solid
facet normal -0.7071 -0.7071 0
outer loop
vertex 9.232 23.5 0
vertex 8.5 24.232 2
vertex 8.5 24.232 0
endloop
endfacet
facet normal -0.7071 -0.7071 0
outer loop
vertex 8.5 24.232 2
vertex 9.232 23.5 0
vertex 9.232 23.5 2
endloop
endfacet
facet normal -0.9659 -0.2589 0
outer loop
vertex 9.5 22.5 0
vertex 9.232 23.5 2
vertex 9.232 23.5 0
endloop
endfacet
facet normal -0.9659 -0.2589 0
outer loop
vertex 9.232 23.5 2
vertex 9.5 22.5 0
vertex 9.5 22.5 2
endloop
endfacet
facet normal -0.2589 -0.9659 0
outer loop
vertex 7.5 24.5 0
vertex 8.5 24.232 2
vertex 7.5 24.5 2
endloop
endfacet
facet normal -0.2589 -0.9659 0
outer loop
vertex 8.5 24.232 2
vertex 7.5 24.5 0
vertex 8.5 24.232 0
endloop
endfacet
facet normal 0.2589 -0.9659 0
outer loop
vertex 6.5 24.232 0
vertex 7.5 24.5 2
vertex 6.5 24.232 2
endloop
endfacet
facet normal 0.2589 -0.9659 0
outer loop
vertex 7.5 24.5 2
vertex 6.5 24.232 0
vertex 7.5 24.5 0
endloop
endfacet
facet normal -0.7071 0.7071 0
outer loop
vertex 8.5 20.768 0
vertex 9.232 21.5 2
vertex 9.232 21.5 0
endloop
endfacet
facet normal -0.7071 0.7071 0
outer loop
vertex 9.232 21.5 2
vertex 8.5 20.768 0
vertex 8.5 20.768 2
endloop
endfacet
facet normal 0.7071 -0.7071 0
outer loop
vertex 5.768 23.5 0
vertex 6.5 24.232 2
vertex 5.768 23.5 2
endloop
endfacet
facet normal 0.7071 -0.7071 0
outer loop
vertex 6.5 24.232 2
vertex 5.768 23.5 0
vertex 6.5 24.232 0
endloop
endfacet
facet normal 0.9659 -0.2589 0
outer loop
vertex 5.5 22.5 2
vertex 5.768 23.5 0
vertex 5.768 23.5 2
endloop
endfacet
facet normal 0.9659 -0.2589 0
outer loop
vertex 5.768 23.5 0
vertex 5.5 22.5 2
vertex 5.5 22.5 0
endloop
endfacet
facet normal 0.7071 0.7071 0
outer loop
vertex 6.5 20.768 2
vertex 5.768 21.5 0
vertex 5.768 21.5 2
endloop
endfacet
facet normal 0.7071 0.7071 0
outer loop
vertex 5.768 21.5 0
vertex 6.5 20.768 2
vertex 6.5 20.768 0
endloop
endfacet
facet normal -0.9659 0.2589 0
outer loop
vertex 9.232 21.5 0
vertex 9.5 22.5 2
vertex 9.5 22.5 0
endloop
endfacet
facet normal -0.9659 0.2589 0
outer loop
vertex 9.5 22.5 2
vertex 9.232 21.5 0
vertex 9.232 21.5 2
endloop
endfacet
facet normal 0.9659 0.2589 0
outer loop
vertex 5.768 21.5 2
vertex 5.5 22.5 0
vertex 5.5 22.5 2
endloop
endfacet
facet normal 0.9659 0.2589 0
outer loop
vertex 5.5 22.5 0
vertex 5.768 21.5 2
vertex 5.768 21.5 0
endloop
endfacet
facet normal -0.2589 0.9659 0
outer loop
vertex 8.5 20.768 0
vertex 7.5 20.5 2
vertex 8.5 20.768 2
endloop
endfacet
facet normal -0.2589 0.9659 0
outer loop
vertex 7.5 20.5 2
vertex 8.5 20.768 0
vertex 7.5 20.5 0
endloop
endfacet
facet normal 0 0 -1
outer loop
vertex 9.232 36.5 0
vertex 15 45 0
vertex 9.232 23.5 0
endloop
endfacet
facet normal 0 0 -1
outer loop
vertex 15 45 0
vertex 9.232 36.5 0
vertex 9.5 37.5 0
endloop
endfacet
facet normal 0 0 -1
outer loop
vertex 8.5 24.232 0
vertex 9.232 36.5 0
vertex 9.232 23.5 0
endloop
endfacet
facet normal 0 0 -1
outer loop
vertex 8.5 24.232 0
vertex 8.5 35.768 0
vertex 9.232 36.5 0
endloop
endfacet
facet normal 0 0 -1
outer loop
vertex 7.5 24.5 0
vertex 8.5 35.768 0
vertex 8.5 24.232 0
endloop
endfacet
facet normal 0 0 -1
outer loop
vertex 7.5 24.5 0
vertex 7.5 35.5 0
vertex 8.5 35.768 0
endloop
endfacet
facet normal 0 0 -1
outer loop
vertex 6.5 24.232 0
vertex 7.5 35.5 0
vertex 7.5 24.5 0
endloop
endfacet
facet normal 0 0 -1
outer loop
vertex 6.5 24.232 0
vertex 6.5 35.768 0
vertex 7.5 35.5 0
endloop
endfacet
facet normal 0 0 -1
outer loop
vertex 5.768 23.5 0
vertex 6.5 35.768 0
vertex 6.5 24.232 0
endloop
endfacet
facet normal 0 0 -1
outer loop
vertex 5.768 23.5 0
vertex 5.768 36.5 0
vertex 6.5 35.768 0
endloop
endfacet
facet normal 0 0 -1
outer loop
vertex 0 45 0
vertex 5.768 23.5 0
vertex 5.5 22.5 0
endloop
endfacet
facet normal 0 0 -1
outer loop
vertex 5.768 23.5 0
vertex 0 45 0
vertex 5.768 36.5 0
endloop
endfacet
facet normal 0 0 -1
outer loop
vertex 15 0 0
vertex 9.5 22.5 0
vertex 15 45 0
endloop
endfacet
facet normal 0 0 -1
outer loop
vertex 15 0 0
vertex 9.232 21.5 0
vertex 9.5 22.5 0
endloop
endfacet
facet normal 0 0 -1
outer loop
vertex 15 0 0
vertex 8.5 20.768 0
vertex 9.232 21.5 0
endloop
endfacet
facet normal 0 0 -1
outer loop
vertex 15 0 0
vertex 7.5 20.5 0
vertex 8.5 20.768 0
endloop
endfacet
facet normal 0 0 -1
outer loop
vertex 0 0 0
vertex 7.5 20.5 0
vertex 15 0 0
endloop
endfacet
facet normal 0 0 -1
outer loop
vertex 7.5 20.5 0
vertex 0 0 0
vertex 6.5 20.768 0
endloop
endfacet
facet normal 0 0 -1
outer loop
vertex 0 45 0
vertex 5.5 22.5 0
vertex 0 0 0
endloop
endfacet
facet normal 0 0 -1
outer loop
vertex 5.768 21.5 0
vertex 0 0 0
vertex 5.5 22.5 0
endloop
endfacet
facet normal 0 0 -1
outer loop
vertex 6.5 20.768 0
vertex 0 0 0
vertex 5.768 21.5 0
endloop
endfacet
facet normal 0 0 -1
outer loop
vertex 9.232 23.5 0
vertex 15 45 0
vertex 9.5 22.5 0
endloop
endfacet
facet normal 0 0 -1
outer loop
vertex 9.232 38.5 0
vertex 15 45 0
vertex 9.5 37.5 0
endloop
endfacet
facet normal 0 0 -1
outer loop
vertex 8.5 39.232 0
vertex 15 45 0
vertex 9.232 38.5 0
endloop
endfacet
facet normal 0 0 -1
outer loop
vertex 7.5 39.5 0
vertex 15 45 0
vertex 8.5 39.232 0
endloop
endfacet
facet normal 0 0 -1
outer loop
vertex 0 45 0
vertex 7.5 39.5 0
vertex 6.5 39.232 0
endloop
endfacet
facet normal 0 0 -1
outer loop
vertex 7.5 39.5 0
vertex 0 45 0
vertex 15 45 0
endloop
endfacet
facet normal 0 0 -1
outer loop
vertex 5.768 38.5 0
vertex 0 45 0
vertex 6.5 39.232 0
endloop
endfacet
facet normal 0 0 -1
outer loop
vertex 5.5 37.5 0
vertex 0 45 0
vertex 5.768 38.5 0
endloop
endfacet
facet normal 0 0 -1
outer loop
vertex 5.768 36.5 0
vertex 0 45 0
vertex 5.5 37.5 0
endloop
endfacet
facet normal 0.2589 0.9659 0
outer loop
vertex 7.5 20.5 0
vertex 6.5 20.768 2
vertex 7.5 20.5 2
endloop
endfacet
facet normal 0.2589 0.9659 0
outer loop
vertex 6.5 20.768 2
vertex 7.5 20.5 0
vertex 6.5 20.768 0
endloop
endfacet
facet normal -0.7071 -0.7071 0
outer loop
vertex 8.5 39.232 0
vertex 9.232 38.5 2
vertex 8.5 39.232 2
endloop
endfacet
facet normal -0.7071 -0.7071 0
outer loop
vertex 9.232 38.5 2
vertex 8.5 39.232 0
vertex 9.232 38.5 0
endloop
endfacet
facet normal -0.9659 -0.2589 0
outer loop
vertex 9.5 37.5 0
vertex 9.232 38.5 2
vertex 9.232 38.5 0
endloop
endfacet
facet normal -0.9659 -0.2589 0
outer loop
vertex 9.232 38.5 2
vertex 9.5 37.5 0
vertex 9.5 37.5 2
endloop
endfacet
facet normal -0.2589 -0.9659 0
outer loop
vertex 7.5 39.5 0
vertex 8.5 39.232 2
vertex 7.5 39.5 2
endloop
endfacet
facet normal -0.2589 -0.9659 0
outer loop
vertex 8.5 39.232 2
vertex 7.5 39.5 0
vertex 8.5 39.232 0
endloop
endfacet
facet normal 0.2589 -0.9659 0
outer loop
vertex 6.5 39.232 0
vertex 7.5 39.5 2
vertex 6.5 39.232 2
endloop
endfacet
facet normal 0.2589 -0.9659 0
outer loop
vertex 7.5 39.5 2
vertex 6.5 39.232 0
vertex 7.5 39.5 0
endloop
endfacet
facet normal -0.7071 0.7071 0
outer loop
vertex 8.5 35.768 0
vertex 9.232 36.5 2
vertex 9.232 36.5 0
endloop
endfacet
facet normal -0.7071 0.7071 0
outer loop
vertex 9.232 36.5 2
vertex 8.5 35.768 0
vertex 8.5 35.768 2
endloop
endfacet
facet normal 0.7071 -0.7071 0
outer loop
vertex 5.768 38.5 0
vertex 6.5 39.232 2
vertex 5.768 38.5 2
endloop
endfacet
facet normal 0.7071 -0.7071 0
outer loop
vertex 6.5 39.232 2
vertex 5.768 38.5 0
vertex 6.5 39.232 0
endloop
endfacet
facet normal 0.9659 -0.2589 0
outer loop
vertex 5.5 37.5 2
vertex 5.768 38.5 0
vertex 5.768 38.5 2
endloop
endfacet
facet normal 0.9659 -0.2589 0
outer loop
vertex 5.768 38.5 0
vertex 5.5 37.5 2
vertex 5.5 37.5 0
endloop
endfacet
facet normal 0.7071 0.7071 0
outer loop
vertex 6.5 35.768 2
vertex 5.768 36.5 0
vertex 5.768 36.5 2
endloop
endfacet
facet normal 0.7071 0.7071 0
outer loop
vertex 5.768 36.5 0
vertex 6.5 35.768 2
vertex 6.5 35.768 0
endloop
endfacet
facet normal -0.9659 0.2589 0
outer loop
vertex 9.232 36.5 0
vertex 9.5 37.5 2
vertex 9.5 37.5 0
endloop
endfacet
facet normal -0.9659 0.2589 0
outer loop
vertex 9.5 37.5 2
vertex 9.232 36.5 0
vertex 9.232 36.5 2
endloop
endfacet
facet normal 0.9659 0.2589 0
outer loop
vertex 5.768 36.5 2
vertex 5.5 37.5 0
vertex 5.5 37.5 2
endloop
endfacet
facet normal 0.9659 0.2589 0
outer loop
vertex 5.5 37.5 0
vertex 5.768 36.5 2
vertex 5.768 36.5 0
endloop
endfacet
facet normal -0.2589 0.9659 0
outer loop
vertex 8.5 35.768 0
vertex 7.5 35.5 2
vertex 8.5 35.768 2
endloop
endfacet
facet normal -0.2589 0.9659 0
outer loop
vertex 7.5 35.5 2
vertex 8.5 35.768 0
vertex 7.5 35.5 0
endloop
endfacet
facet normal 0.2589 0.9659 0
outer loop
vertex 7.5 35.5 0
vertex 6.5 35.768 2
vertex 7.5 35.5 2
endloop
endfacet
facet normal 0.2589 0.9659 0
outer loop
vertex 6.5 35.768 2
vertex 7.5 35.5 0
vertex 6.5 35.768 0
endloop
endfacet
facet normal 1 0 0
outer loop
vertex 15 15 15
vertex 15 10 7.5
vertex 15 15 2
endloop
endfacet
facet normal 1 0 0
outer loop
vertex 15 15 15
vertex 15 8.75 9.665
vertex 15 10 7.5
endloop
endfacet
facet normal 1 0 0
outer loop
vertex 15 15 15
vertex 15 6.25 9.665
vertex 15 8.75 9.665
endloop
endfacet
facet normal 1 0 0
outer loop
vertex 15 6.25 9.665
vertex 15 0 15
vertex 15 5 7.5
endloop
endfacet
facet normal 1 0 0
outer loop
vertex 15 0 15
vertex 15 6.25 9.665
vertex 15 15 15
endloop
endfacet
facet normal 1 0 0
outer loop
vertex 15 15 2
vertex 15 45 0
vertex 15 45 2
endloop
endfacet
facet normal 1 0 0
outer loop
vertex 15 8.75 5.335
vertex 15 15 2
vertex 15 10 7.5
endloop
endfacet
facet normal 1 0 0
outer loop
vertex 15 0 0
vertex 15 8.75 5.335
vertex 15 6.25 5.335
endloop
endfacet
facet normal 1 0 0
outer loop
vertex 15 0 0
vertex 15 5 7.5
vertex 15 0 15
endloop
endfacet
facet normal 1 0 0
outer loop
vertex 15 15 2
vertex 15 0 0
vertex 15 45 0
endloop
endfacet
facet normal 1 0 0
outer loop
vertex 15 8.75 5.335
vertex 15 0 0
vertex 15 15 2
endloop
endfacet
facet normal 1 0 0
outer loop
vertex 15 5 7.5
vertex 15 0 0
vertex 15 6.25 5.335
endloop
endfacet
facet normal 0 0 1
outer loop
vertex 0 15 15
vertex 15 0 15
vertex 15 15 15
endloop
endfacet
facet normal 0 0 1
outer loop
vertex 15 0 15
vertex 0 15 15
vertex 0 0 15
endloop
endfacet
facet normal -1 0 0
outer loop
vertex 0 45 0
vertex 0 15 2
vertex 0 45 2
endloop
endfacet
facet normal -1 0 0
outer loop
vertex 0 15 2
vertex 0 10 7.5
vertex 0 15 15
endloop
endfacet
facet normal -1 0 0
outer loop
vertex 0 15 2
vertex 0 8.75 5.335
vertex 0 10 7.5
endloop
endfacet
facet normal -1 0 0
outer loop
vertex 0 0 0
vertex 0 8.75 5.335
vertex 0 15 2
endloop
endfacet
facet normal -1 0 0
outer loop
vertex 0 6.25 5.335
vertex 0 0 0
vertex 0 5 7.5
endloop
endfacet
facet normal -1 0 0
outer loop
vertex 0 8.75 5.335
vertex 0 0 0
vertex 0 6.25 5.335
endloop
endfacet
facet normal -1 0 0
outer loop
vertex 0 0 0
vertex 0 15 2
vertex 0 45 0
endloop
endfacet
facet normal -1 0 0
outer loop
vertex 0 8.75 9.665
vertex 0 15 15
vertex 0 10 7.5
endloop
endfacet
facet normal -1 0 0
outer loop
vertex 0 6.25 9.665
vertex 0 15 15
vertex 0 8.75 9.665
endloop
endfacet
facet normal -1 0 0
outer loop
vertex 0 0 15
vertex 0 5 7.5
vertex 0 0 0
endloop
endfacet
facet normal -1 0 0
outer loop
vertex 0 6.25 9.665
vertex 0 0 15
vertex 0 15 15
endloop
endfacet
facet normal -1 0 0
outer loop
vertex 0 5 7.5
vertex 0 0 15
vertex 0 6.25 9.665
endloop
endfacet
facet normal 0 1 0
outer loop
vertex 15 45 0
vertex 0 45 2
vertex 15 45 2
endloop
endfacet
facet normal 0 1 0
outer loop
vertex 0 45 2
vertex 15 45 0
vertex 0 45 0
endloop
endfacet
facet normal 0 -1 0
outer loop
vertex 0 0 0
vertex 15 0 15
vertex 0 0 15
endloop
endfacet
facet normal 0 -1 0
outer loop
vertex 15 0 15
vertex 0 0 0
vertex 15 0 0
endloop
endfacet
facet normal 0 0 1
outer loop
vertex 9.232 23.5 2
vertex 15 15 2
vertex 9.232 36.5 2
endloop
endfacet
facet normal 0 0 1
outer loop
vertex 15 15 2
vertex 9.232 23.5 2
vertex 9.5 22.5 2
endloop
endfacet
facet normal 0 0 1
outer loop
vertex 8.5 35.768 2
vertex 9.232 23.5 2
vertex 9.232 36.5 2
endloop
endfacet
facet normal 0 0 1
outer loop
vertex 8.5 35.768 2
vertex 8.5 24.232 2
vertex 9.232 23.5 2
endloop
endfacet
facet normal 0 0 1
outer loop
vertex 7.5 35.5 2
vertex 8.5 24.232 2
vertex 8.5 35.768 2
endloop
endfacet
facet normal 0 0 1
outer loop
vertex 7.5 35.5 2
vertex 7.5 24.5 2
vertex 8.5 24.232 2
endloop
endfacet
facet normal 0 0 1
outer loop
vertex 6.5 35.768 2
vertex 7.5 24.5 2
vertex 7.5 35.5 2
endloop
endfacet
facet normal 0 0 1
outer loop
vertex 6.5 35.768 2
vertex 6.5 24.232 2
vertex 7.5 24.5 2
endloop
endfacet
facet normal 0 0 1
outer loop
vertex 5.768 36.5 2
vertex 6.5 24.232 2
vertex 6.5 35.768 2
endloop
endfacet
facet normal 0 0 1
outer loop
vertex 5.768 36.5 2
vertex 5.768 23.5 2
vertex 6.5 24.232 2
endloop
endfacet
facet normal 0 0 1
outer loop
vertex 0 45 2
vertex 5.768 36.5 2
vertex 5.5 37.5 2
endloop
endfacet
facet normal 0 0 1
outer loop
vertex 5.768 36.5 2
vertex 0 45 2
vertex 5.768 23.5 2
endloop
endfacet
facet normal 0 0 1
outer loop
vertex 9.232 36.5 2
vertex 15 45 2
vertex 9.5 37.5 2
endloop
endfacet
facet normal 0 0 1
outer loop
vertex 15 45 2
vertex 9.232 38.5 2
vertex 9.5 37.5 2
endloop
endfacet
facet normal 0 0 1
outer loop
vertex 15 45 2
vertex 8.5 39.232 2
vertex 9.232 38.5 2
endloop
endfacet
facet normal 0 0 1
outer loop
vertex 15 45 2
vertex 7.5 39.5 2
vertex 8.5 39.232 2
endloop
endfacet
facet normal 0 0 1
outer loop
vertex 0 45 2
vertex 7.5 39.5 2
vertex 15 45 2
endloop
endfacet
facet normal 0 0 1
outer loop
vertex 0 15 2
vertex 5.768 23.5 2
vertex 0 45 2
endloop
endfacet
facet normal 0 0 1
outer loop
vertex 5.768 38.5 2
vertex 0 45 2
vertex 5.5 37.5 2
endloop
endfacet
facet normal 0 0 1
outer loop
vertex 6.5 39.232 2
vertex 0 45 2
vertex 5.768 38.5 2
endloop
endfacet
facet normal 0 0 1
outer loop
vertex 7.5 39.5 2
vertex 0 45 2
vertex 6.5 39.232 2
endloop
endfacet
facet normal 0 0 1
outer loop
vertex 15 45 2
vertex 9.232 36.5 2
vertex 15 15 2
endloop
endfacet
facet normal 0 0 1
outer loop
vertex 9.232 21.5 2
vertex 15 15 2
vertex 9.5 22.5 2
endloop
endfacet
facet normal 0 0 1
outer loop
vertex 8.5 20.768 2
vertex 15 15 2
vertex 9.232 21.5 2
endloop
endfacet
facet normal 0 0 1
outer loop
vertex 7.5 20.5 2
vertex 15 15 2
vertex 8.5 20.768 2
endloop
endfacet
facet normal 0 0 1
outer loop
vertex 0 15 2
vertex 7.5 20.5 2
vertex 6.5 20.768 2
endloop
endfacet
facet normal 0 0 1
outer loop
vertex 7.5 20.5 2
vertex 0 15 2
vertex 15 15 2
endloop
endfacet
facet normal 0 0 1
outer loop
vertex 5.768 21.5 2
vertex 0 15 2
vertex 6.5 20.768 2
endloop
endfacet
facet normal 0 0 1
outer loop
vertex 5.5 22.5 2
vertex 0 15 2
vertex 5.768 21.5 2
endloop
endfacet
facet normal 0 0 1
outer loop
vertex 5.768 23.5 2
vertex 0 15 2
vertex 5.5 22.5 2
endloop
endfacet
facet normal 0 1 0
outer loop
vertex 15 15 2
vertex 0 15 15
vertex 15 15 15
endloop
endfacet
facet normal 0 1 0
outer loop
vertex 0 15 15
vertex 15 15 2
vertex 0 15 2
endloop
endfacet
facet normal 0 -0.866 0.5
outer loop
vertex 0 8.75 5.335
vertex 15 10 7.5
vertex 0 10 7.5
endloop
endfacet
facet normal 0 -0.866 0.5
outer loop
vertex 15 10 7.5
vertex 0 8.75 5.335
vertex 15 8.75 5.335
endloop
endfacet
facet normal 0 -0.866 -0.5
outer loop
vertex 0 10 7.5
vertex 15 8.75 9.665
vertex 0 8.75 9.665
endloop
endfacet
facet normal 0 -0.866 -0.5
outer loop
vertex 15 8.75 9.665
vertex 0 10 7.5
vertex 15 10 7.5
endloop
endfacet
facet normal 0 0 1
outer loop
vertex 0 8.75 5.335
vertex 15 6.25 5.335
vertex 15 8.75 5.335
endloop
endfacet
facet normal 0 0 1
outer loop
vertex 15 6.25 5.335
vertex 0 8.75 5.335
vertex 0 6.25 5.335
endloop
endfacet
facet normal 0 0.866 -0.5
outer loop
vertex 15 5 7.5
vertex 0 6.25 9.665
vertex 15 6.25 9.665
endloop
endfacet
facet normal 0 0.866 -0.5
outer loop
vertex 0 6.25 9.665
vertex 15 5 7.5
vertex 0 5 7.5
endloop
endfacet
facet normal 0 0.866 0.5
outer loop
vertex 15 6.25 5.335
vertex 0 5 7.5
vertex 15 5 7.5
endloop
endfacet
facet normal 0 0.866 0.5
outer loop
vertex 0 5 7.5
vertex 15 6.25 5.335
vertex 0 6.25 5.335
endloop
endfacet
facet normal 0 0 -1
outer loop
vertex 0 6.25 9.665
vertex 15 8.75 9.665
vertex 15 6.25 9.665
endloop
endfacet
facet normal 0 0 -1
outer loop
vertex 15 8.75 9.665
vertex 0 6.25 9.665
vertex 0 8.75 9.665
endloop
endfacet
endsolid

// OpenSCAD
holenum = 2;
diameter = 5;

difference() {
	cube([15, 15 + 15 * holenum, 15]);
	translate([0, 15, 2]) cube([15, 15 * holenum, 15]);
	translate([0, 7.5, 7.5]) rotate([30, 0, 0]) rotate([0, 90, 0]) cylinder(h = 15, d = diameter, $fn = 6);
	for(i = [0 : holenum]) {
		translate([7.5, 22.5 + 15 * i]) cylinder(h = 15, d = 4, $fn = 12);
	}
}
